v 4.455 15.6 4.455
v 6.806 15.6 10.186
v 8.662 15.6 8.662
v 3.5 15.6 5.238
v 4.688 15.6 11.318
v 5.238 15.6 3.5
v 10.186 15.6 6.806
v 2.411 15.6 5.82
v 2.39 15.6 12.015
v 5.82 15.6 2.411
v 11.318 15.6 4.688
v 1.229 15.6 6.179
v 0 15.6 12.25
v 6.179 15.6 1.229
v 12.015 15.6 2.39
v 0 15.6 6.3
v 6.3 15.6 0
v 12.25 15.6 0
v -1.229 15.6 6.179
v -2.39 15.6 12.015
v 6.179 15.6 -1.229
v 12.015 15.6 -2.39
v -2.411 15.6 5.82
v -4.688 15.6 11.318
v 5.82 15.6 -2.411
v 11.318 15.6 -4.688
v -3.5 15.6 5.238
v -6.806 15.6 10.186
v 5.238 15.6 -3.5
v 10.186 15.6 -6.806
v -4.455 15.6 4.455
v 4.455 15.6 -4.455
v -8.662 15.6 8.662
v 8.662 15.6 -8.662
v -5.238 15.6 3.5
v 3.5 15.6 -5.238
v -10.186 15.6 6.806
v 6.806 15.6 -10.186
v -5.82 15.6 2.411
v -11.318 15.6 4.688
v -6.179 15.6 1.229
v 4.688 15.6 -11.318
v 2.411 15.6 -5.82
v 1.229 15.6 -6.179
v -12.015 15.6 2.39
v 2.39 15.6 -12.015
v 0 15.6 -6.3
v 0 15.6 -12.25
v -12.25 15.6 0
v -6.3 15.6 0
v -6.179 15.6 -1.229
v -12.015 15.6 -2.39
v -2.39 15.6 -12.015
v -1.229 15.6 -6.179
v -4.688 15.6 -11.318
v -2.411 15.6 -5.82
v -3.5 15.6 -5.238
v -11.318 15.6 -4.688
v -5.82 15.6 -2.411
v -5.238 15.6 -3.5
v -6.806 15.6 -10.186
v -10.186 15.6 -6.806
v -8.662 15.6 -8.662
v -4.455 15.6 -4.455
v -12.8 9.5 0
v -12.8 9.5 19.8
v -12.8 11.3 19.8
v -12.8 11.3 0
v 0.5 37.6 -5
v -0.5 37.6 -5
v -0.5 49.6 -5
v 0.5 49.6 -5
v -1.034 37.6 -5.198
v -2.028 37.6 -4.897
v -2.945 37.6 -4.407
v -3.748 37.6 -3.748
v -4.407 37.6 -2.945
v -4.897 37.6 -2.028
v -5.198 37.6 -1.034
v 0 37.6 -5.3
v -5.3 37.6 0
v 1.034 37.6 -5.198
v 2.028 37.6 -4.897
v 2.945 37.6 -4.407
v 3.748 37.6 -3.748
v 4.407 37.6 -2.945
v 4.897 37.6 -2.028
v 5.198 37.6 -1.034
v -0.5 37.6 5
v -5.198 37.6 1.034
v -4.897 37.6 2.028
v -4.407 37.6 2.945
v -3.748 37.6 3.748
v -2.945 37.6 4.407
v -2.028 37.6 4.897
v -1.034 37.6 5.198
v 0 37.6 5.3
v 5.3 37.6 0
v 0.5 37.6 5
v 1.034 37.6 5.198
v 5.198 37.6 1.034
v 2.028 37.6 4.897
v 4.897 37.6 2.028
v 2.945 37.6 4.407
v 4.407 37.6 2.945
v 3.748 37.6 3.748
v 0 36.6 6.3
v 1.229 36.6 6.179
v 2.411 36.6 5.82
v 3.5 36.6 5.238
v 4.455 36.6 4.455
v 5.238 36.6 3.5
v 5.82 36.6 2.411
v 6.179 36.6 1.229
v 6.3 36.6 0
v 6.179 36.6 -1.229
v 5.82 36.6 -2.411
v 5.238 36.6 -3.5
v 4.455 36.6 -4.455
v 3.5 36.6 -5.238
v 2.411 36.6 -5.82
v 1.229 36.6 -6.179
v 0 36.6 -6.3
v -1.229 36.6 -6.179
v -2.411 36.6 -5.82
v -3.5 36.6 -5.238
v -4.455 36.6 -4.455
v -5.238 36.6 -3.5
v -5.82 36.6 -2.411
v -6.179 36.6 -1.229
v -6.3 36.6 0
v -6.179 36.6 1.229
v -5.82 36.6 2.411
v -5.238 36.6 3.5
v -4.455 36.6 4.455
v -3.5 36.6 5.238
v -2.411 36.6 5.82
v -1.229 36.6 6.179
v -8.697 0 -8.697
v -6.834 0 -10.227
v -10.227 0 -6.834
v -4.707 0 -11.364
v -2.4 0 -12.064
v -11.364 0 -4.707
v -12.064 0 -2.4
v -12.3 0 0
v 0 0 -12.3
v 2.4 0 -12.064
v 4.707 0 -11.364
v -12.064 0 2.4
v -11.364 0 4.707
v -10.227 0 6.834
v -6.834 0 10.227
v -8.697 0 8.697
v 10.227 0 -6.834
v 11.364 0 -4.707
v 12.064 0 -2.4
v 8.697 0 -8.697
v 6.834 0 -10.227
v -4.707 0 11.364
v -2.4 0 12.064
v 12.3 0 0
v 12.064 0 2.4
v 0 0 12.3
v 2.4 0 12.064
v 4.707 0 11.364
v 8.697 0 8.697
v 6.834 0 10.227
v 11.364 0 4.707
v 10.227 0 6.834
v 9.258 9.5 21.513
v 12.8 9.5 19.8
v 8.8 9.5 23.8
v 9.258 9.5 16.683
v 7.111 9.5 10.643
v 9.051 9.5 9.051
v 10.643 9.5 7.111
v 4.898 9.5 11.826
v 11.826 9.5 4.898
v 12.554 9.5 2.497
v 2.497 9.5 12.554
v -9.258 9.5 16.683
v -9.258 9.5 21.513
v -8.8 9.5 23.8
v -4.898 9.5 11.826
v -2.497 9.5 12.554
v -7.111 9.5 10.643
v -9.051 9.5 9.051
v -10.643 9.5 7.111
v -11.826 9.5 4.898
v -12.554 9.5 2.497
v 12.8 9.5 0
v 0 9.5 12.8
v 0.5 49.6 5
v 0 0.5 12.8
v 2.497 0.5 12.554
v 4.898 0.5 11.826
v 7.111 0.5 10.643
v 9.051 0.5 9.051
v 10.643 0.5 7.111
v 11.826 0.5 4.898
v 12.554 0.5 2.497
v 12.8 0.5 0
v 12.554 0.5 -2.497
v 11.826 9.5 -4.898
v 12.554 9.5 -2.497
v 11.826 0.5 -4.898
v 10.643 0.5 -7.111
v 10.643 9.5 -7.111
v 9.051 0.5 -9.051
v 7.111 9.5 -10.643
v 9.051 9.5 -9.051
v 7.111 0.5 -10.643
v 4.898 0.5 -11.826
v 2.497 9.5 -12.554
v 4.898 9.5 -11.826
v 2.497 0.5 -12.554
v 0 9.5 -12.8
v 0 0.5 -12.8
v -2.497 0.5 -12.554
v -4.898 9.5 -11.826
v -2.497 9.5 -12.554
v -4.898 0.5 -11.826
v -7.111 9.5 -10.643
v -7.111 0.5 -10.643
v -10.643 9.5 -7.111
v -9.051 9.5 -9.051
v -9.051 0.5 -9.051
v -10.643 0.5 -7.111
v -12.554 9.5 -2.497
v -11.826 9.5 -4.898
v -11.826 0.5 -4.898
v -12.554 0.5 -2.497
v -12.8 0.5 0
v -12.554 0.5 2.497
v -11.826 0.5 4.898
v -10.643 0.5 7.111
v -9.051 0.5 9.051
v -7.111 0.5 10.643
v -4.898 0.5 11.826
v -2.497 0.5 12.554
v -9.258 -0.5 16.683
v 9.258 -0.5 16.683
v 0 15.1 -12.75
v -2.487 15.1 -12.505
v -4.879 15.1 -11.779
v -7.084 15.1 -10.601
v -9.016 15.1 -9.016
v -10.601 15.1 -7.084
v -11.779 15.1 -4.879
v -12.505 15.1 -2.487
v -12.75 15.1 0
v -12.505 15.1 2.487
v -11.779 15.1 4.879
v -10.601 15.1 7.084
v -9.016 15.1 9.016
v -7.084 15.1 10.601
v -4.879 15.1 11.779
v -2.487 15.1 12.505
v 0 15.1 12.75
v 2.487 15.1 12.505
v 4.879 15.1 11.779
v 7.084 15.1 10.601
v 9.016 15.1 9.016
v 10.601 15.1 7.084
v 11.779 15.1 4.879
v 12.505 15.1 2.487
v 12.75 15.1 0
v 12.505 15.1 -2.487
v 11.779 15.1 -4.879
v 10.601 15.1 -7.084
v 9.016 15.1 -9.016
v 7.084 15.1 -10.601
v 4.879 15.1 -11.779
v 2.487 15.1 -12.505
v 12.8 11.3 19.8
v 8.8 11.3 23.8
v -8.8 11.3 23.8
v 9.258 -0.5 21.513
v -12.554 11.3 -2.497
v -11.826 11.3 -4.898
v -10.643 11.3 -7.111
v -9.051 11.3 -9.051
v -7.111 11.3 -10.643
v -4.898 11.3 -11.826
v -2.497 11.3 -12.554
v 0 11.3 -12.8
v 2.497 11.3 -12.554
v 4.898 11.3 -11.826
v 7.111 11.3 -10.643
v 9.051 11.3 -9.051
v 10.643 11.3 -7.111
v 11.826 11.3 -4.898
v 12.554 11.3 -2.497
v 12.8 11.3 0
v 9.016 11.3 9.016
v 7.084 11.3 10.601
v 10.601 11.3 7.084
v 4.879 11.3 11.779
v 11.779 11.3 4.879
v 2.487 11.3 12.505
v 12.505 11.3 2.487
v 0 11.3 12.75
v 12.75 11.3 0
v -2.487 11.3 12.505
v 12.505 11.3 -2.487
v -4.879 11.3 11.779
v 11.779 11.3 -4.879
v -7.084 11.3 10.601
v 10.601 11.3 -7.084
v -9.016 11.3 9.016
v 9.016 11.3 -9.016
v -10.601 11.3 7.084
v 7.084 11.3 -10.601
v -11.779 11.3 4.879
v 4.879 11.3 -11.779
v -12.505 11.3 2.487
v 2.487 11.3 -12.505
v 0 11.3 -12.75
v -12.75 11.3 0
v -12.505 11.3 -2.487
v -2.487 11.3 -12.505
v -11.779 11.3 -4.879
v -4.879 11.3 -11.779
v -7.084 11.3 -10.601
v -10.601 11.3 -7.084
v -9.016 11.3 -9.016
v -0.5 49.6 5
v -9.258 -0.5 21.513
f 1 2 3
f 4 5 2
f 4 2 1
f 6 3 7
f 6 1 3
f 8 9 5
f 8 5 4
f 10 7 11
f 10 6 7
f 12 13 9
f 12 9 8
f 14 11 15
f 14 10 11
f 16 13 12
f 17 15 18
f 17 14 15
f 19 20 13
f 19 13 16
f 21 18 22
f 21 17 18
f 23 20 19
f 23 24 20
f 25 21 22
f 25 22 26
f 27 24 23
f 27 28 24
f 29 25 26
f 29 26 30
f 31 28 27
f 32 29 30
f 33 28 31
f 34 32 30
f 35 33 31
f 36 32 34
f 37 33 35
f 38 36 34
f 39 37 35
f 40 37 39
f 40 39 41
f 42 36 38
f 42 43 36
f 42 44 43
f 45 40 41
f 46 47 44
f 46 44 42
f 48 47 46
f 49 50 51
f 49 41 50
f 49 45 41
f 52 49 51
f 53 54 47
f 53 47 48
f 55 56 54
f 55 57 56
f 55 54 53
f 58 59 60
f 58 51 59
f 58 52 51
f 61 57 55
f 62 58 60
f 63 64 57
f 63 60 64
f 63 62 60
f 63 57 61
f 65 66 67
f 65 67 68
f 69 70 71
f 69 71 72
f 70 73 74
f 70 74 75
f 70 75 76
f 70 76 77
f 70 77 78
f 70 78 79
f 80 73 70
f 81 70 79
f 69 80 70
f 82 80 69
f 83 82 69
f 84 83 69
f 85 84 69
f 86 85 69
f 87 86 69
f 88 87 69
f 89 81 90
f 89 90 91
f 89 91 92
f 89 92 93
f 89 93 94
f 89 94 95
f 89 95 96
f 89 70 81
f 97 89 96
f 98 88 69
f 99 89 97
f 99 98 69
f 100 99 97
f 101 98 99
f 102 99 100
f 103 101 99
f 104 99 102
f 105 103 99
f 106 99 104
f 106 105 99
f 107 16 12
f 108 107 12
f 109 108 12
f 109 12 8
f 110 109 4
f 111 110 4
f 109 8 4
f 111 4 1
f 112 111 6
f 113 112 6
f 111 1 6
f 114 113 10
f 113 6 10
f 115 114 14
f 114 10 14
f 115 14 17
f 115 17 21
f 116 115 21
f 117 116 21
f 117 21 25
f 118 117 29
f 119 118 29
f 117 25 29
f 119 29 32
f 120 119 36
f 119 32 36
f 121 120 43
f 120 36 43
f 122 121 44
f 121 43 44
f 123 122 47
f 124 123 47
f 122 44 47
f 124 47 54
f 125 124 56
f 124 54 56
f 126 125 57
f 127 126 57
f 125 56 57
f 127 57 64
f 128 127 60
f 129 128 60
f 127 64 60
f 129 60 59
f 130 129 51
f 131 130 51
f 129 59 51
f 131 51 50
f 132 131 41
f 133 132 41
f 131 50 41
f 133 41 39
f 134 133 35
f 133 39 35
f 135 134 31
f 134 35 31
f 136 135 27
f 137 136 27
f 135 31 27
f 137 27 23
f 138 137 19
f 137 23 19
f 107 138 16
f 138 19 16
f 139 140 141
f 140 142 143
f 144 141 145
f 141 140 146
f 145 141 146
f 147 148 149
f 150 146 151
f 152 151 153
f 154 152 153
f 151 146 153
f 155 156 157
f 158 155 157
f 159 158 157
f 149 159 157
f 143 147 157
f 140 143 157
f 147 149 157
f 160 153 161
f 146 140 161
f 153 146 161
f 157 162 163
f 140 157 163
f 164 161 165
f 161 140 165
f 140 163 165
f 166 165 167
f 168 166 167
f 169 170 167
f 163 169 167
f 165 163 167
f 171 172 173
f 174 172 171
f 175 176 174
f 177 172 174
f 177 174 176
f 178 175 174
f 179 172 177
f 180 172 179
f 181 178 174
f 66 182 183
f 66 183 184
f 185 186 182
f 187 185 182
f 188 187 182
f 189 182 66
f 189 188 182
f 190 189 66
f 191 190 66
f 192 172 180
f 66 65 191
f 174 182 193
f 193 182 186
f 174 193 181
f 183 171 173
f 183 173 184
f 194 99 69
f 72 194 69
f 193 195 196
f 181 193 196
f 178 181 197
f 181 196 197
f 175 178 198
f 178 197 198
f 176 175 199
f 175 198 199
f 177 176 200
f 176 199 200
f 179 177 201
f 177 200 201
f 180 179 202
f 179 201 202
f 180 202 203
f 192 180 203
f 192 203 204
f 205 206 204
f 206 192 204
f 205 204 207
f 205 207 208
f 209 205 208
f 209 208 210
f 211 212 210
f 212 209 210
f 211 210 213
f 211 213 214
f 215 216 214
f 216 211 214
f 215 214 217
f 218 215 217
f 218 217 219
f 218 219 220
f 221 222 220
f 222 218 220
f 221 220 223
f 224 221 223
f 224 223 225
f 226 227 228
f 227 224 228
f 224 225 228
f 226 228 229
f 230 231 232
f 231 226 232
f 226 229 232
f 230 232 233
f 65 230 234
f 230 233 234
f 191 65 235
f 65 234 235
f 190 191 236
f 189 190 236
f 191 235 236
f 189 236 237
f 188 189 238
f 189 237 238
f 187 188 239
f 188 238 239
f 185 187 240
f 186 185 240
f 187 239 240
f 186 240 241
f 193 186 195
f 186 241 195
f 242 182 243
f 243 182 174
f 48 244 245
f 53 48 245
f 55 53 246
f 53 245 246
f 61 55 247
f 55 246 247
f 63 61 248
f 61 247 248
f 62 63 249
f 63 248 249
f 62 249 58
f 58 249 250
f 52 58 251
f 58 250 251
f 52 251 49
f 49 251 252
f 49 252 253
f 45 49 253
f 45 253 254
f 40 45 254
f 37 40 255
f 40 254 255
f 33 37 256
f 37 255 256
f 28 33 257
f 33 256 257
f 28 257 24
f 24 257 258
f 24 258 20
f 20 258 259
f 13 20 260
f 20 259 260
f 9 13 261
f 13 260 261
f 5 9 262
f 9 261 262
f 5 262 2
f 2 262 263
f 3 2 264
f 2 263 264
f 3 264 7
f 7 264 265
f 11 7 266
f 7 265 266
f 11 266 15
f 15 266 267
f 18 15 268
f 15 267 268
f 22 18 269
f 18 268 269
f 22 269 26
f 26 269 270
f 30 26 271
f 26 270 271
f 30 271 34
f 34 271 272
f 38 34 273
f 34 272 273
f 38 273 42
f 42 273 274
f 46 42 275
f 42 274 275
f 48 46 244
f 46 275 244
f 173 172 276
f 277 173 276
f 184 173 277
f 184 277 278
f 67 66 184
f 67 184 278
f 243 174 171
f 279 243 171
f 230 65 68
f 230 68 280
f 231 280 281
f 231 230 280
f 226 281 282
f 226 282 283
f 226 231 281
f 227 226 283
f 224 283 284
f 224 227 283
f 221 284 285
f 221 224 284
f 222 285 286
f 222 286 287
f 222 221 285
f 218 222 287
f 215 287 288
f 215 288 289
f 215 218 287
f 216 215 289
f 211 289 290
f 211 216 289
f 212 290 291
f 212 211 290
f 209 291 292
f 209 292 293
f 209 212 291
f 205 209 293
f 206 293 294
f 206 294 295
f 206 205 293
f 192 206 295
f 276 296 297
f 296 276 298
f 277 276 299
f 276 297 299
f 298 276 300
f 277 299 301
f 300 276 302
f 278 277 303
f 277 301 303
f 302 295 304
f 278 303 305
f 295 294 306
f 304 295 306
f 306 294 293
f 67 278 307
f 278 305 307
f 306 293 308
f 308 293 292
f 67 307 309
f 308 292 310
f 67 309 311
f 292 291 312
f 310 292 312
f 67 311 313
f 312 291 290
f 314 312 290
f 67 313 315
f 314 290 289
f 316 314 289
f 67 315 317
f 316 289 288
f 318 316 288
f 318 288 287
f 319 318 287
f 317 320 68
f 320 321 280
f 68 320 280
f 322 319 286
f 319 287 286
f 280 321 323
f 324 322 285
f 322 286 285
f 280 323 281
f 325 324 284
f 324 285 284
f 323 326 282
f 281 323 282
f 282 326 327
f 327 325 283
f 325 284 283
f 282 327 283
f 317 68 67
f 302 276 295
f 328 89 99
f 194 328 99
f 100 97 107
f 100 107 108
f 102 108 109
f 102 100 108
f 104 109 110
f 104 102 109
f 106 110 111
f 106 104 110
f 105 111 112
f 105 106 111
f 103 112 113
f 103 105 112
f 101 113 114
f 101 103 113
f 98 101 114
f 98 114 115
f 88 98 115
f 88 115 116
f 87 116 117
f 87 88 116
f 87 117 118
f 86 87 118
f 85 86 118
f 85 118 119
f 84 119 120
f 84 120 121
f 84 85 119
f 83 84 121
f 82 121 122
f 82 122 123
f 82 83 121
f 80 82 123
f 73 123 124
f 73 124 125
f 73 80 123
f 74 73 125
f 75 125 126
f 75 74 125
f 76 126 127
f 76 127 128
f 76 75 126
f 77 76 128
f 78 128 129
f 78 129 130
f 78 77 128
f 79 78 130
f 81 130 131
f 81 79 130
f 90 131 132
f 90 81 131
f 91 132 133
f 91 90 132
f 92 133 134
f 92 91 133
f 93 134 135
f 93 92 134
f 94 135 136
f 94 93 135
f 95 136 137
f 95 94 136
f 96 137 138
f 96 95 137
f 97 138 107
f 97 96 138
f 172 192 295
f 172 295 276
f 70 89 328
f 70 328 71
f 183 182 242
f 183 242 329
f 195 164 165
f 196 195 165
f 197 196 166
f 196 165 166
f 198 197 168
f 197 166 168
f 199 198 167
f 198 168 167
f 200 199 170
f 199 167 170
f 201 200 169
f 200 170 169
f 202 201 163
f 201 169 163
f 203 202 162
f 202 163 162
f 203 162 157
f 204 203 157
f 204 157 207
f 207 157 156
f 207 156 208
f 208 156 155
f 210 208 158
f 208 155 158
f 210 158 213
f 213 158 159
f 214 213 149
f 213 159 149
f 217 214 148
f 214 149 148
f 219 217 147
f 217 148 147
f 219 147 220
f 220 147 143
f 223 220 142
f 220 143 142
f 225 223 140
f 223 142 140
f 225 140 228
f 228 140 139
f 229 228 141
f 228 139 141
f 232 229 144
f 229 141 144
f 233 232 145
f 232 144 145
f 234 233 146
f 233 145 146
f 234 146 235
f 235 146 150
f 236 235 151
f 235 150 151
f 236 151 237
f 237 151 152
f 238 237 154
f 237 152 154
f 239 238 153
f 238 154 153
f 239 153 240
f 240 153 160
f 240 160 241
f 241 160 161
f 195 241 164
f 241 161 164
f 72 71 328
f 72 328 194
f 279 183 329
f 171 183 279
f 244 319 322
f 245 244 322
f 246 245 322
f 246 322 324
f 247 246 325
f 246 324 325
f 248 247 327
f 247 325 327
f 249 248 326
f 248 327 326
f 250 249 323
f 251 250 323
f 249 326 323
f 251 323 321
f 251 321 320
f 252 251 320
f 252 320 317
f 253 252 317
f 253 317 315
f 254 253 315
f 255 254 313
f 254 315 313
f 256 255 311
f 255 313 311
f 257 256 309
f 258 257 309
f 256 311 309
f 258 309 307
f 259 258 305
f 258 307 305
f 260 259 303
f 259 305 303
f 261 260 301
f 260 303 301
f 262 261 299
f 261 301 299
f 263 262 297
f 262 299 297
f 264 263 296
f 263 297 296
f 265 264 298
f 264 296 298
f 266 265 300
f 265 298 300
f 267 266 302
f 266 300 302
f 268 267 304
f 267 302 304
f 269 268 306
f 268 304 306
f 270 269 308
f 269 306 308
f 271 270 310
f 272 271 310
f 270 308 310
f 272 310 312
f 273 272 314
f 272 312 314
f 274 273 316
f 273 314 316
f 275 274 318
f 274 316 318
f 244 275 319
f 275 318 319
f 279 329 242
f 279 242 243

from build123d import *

# Parameters (mm, degrees)
SKETCH1_R           = 12.8
BOSS_EXTRUDE1_DEPTH = 9.5
BOSS_EXTRUDE2_DEPTH = 1.8
SKETCH3_R           = 12.75
BOSS_EXTRUDE3_DEPTH = 4.3
SKETCH4_R           = 6.3
BOSS_EXTRUDE4_DEPTH = 22
CHAMFER1_SIZE       = 1
CHAMFER2_SIZE       = 0.5
SKETCH5_W           = 18.515372874
SKETCH5_H           = 4.830097271
BOSS_EXTRUDE5_DEPTH = 10
SKETCH6_W           = 1
SKETCH6_H           = 10
BOSS_EXTRUDE6_DEPTH = 12
CHAMFER3_SIZE       = 4


with BuildPart() as part:
    # Sketch1 → Boss-Extrude1 (new body)
    with BuildSketch(Plane(origin=(0, 0, 0), x_dir=(1, 0, 0), z_dir=(0, 1, 0))):
        with Locations(Location((0, 0, 0), (0, 0, 270))):
            Circle(SKETCH1_R)
    extrude(amount=BOSS_EXTRUDE1_DEPTH)

    # Sketch2 → Boss-Extrude2 (add)
    with BuildSketch(Plane(origin=(0, 9.5, 0), x_dir=(1, 0, 0), z_dir=(0, 1, 0))):
        with BuildLine():
            Line((12.8, -23.8), (-12.8, -23.8))
            Line((-12.8, -23.8), (-12.8, 0))
            ThreePointArc((-12.8, 0), (0, 12.8), (12.8, 0))
            Line((12.8, 0), (12.8, -23.8))
        make_face()
    extrude(amount=BOSS_EXTRUDE2_DEPTH)

    # Sketch3 → Boss-Extrude3 (add)
    with BuildSketch(Plane(origin=(0, 11.3, 0), x_dir=(1, 0, 0), z_dir=(0, 1, 0))):
        with Locations(Location((0, 0, 0), (0, 0, 90))):
            Circle(SKETCH3_R)
    extrude(amount=BOSS_EXTRUDE3_DEPTH)

    # Sketch4 → Boss-Extrude4 (add)
    with BuildSketch(Plane(origin=(0, 15.6, 0), x_dir=(1, 0, 0), z_dir=(0, 1, 0))):
        with Locations(Location((0, 0, 0), (0, 0, 270))):
            Circle(SKETCH4_R)
    extrude(amount=BOSS_EXTRUDE4_DEPTH)

    # Chamfer1
    chamfer1_edges = [part.edges().sort_by_distance(p)[0] for p in [
        (0, 37.6, -6.3),
    ]]
    chamfer(chamfer1_edges, length=CHAMFER1_SIZE)

    # Chamfer2
    chamfer2_edges = [part.edges().sort_by_distance(p)[0] for p in [
        (0, 0, -12.8),
        (0, 15.6, 12.75),
    ]]
    chamfer(chamfer2_edges, length=CHAMFER2_SIZE)

    # Sketch5 → Boss-Extrude5 (add)
    with BuildSketch(Plane.XZ.offset(-9.5)):
        with Locations((0, 19.097773841)):
            Rectangle(SKETCH5_W, SKETCH5_H)
    extrude(amount=BOSS_EXTRUDE5_DEPTH)

    # Sketch6 → Boss-Extrude6 (add)
    with BuildSketch(Plane(origin=(0, 37.6, 0), x_dir=(1, 0, 0), z_dir=(0, 1, 0))):
        Rectangle(SKETCH6_W, SKETCH6_H)
    extrude(amount=BOSS_EXTRUDE6_DEPTH)

    # Chamfer3
    chamfer3_edges = [part.edges().sort_by_distance(p)[0] for p in [
        (-12.8, 10.4, 23.8),
        (12.8, 10.4, 23.8),
    ]]
    chamfer(chamfer3_edges, length=CHAMFER3_SIZE)


solid = part.part
